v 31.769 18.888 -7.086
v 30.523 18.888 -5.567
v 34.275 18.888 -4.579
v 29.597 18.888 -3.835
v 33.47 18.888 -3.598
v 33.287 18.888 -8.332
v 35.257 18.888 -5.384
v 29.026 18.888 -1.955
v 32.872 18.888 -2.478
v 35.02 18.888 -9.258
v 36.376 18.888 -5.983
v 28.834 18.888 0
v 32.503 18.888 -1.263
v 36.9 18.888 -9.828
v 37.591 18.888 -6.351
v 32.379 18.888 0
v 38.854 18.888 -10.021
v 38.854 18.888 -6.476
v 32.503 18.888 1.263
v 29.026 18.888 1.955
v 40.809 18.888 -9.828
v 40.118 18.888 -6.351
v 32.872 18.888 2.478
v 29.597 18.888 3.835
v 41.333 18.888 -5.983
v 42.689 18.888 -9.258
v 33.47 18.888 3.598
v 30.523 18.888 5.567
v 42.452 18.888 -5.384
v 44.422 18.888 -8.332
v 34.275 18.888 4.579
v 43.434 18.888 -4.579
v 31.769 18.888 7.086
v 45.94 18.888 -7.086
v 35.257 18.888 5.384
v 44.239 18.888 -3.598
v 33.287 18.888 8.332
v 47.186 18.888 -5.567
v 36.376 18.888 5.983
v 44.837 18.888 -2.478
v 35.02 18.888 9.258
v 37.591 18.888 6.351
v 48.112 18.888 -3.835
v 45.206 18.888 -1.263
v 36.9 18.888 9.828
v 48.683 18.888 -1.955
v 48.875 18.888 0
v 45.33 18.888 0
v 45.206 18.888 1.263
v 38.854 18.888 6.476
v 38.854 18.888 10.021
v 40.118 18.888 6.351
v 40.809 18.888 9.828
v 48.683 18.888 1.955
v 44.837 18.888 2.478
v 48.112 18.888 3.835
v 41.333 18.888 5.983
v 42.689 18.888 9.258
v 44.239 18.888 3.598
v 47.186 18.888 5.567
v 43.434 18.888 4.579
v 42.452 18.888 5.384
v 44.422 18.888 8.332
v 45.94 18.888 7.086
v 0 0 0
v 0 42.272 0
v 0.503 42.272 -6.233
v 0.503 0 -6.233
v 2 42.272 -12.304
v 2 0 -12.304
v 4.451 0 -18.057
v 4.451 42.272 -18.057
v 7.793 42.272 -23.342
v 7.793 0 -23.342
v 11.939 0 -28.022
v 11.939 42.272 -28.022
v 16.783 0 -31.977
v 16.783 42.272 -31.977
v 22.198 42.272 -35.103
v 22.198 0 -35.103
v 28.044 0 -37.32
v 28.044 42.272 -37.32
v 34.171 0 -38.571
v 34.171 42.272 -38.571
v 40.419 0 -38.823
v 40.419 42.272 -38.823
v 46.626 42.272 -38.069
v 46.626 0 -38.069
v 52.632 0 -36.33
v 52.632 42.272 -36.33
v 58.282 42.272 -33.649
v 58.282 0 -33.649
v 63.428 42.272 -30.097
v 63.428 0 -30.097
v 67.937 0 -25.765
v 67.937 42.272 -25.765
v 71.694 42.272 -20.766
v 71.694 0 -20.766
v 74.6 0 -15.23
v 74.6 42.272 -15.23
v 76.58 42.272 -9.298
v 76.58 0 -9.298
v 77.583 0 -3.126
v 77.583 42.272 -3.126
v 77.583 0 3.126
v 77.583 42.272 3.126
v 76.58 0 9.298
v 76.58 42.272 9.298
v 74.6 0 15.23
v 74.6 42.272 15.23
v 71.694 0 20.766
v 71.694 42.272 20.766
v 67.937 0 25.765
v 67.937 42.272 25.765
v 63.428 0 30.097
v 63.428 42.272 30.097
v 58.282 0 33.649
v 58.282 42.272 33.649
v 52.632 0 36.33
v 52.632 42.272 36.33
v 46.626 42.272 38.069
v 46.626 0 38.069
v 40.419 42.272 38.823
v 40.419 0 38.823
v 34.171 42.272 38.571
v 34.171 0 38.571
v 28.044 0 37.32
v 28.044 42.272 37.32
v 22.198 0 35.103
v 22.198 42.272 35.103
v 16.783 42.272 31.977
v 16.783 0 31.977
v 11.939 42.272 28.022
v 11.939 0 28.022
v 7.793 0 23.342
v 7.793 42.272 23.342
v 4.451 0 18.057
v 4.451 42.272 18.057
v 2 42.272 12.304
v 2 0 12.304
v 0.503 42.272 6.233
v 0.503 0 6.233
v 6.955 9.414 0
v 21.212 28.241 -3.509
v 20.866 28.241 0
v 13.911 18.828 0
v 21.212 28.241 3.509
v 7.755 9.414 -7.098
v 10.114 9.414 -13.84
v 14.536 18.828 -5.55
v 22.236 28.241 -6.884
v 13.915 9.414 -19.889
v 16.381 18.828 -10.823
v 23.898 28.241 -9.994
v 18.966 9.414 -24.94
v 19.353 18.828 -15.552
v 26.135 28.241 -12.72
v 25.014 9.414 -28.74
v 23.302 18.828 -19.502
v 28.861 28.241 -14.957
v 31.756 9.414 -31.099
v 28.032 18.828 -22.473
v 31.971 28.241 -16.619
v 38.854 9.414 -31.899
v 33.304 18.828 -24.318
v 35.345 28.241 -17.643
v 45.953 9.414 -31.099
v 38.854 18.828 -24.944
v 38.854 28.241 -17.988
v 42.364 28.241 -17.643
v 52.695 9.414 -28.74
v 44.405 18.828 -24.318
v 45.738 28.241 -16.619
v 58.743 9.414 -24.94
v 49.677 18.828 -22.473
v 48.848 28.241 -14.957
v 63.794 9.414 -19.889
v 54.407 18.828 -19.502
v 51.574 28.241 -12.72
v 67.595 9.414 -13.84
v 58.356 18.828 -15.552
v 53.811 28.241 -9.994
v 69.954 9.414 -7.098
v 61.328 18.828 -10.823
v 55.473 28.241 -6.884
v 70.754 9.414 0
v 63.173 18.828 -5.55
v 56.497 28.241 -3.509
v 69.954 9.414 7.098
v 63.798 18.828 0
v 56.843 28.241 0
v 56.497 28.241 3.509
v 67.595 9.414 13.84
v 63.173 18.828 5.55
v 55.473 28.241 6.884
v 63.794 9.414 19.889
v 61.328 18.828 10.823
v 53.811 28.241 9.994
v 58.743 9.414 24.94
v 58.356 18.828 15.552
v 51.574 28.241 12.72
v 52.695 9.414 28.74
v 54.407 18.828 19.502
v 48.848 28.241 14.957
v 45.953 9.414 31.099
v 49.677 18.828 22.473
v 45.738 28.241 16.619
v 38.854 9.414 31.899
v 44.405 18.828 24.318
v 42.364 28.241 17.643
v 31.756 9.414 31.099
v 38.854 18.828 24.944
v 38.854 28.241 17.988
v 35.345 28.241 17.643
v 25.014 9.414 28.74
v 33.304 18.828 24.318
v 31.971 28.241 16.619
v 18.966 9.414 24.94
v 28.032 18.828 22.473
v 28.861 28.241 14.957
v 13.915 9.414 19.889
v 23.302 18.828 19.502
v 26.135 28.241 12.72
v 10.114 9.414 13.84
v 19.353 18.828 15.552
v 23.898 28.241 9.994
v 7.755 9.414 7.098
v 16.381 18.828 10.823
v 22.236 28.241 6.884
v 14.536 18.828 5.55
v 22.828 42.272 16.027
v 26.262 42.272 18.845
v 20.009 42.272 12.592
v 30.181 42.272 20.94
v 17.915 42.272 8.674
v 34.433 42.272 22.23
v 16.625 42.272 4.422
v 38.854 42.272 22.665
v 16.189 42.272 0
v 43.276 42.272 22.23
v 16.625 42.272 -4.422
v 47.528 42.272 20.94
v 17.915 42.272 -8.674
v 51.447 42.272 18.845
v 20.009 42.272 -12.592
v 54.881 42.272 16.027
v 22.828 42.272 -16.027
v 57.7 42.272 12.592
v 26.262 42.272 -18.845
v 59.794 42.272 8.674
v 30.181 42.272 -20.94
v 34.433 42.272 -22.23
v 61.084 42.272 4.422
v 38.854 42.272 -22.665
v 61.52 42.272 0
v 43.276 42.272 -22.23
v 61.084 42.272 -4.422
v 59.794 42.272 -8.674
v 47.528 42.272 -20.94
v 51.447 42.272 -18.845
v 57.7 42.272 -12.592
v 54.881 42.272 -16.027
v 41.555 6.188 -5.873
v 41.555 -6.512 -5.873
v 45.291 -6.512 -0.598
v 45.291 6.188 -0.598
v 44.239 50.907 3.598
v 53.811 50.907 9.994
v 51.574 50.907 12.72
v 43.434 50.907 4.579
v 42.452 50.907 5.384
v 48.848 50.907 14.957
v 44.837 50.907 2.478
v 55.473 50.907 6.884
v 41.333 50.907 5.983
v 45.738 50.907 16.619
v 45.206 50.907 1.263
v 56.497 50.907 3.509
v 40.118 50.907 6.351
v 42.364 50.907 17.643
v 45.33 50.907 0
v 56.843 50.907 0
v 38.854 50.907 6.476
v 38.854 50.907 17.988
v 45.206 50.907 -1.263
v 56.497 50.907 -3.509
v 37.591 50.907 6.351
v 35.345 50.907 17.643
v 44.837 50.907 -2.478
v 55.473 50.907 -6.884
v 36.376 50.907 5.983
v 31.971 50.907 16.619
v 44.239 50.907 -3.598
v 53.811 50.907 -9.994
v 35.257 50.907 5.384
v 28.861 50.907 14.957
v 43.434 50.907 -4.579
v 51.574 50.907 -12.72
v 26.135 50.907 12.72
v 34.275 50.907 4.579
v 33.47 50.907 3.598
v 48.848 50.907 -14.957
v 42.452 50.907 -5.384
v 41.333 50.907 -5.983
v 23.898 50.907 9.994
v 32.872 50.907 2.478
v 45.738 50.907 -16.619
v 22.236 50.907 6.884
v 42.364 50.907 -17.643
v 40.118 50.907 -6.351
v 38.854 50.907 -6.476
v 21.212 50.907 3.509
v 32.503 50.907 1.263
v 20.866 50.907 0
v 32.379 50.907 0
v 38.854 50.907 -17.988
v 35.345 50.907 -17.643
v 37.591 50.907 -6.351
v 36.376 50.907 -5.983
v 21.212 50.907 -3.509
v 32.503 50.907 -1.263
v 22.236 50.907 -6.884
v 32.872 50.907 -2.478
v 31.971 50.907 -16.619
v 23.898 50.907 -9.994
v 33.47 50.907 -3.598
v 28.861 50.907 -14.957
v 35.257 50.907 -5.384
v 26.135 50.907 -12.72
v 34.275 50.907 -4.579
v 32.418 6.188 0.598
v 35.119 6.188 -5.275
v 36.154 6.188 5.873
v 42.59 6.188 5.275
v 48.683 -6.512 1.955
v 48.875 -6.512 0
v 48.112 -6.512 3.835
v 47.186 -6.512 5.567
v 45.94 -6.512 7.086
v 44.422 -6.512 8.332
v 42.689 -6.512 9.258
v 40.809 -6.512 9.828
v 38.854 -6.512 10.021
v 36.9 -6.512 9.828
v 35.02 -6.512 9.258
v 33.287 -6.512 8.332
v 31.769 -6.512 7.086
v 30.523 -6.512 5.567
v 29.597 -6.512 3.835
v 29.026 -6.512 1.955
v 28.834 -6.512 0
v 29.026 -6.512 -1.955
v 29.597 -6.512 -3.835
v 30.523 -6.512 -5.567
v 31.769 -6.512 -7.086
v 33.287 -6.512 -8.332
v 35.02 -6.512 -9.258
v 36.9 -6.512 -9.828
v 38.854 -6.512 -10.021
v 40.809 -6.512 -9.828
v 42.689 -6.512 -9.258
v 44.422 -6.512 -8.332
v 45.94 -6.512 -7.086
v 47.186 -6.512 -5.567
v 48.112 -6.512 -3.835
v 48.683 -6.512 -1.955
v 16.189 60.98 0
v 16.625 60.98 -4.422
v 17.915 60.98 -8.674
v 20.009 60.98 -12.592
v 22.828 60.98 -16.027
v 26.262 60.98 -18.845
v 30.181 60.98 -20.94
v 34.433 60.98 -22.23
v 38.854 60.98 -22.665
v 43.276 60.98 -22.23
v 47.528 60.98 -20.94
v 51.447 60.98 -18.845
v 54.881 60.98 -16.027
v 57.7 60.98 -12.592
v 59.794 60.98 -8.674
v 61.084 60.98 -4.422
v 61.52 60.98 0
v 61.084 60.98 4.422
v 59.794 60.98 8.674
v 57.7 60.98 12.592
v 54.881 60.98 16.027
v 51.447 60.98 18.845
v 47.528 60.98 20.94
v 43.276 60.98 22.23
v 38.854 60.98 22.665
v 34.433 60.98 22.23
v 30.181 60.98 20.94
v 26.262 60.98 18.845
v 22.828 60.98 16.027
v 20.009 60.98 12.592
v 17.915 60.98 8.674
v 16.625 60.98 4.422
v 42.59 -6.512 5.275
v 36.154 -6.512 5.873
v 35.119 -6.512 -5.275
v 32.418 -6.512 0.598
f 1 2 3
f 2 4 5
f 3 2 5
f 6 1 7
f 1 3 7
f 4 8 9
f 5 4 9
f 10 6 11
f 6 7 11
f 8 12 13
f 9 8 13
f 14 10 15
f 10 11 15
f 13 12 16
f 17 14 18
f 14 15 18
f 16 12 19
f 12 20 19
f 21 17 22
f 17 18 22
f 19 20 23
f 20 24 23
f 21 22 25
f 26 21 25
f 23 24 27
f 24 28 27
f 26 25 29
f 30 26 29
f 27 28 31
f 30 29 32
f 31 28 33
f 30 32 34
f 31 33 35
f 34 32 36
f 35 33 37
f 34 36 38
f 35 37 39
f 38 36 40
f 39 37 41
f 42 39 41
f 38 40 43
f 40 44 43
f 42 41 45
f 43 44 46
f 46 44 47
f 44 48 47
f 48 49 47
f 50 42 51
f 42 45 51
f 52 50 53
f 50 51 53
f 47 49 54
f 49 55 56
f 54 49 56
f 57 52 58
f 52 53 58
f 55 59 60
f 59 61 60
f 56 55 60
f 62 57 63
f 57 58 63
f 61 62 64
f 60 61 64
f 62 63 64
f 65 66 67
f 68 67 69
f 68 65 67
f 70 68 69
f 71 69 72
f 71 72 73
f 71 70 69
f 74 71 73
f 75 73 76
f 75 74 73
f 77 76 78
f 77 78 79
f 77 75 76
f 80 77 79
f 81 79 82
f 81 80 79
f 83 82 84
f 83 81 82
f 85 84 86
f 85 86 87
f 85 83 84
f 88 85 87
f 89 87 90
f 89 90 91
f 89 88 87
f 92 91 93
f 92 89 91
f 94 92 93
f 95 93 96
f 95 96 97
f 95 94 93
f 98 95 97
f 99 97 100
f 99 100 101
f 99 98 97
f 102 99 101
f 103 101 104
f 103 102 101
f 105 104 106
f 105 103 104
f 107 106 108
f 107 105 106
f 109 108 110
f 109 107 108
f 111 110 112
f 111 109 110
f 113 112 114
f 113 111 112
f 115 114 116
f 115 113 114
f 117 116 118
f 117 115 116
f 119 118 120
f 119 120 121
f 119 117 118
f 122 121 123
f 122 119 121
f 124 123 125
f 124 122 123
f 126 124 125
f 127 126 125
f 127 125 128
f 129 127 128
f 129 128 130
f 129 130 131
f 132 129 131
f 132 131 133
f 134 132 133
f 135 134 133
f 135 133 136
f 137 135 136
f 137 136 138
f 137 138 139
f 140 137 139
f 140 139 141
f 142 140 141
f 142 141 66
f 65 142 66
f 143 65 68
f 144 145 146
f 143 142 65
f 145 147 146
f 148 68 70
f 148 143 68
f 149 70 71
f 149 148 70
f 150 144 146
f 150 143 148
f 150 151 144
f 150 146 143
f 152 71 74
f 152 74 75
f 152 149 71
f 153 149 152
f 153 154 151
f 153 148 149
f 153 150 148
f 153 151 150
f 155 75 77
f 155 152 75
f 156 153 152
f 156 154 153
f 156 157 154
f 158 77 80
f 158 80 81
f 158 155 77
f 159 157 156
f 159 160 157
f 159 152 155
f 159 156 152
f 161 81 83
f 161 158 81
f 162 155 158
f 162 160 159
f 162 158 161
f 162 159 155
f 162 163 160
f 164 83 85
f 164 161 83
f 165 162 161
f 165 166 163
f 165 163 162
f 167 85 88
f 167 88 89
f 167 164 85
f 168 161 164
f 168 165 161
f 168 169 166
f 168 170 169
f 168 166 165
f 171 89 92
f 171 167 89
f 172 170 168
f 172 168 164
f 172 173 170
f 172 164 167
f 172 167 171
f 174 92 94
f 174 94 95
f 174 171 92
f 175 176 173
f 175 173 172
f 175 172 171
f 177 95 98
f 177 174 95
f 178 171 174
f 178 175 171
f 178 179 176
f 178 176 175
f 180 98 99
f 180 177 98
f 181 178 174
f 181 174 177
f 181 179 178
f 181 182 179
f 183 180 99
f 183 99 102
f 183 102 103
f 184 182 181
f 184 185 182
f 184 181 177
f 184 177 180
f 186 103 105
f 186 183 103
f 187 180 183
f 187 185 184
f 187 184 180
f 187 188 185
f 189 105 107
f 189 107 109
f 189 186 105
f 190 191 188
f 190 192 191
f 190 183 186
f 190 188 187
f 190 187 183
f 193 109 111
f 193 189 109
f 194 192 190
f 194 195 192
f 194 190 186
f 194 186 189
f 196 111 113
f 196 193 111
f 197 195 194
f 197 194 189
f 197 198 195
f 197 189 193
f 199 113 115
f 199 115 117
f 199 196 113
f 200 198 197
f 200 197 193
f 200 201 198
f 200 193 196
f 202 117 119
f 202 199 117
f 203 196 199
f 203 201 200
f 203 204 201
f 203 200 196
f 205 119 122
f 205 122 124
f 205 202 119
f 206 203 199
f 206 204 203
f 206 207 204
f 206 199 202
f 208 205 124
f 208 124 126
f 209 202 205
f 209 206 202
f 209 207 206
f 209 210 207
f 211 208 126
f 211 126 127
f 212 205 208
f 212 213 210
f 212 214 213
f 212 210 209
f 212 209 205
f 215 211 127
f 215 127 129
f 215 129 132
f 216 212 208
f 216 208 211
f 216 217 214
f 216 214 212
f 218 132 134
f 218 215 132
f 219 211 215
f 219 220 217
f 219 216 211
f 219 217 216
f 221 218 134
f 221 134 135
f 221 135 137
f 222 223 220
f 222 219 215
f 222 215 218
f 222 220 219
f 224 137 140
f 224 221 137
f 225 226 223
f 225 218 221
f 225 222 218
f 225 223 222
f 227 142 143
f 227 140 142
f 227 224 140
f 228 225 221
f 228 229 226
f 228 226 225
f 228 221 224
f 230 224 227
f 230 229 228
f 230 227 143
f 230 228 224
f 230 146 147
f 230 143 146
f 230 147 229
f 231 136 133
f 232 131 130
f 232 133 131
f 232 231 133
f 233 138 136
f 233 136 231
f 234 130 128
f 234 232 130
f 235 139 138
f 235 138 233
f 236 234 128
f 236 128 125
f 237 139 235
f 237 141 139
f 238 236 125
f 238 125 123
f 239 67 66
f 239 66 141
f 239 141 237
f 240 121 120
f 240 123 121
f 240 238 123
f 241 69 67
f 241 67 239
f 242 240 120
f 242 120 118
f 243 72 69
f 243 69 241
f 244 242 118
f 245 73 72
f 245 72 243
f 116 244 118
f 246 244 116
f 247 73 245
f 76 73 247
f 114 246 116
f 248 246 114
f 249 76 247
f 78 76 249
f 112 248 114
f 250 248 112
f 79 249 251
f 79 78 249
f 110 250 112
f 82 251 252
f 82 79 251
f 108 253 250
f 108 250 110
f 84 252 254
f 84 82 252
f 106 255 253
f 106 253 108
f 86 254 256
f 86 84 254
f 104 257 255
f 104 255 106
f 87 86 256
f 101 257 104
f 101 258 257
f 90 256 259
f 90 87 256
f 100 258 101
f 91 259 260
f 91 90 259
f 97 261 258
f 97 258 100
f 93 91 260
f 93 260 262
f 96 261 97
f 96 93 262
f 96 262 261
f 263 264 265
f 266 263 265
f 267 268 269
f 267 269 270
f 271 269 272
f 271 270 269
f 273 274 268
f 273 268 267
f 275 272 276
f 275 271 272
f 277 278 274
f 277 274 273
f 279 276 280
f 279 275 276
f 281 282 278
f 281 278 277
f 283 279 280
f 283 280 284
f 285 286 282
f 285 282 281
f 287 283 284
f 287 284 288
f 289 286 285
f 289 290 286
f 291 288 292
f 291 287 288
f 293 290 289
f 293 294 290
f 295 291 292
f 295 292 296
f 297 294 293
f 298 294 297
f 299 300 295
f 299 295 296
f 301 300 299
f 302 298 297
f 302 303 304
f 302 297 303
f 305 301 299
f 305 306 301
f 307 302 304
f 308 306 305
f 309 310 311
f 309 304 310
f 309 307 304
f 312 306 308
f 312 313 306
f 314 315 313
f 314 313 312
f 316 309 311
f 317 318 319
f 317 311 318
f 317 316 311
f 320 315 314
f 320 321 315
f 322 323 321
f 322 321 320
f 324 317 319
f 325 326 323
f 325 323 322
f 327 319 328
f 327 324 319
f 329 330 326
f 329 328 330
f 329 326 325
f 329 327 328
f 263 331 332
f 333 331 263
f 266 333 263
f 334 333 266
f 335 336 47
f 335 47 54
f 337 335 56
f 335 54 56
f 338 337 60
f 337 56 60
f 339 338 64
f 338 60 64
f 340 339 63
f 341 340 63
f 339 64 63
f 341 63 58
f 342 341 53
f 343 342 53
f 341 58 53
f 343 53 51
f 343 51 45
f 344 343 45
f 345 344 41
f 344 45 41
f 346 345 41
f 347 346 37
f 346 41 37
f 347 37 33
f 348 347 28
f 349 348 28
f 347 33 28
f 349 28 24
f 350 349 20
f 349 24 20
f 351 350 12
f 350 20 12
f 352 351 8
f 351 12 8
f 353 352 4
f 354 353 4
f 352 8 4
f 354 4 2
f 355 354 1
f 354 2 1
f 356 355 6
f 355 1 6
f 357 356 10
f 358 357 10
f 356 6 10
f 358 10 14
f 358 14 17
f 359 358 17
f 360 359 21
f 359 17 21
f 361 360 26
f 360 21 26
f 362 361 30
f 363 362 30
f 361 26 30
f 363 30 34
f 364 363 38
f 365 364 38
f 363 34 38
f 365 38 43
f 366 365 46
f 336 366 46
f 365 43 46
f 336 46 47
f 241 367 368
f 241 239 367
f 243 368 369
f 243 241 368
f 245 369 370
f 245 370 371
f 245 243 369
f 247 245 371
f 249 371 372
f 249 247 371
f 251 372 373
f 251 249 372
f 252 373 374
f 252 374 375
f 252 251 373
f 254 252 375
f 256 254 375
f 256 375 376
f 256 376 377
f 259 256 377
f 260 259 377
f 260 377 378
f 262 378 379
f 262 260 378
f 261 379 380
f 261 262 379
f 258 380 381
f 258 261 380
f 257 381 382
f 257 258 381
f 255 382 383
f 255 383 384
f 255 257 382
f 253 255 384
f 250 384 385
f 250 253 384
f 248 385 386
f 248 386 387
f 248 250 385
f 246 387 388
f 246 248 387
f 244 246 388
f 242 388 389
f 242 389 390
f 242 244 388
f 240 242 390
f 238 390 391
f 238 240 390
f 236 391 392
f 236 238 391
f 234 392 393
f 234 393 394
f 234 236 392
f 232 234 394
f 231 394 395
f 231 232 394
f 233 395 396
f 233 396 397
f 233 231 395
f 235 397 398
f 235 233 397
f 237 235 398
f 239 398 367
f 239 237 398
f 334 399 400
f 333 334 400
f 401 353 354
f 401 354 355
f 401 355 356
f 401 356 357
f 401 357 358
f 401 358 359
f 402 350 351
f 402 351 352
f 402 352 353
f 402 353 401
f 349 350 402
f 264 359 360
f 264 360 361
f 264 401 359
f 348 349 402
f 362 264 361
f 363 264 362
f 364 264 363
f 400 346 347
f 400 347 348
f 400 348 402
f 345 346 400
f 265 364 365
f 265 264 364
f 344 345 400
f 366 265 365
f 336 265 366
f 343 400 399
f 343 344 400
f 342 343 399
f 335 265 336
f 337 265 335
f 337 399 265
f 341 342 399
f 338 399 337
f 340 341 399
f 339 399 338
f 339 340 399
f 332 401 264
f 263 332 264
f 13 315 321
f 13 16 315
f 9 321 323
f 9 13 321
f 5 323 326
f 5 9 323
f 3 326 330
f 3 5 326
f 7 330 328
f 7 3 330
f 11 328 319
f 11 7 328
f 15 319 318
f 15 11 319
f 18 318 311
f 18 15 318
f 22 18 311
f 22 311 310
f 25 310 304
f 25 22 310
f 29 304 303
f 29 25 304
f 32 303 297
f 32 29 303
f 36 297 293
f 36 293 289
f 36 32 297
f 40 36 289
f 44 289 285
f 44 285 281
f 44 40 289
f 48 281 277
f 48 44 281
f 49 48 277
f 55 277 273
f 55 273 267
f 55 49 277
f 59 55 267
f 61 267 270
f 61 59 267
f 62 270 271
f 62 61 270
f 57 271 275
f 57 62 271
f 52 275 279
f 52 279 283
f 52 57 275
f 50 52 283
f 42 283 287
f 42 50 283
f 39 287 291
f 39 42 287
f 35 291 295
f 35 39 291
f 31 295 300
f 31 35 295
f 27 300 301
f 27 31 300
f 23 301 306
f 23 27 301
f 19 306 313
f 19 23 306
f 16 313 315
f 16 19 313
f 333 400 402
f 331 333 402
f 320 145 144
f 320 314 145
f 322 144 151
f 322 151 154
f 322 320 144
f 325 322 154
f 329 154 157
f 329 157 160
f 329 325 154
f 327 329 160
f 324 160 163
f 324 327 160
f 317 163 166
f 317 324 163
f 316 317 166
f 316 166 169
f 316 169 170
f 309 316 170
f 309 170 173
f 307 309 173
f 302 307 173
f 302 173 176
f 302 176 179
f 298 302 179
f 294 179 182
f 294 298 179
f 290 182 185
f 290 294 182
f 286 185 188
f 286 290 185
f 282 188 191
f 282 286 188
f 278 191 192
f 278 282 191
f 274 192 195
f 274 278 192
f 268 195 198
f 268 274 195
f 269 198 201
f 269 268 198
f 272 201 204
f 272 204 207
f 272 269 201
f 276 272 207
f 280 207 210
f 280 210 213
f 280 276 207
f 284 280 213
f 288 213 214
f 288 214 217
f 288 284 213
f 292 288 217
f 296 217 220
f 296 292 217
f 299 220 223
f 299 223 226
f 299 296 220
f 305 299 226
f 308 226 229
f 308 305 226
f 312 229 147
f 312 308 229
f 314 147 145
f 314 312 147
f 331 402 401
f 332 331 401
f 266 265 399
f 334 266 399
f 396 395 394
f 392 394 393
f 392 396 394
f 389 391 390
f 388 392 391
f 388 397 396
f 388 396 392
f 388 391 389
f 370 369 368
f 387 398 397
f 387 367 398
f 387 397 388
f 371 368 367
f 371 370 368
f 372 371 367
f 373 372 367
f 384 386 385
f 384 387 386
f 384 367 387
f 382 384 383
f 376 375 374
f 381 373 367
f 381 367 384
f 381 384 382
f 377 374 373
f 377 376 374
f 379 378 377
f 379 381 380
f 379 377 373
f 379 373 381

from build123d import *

# Parameters (mm, degrees)
F2_R     = 10.020621
F3_DEPTH = 25.4
F5_DEPTH = 12.7


with BuildPart() as f1:
    # F0 (on Top) → F1 (revolve)
    with BuildSketch(Plane.XY):
        Polygon((0, 42.272214), (0, 0), (20.86629, 28.241435), (20.86629, 50.906539), (32.378726, 50.906539), (32.378726, 18.887583), (38.854469, 18.887583), (38.854469, 60.979918), (16.189363, 60.979918), (16.189363, 42.272214), align=None)
    revolve(axis=Axis((38.854469, 39.93375, 0), (0, -1, 0)))

    # F2 (on face) → F3 (join)
    with BuildSketch(Plane.XZ.offset(-18.887583)):
        with Locations((38.854469, 0)):
            Circle(F2_R)
    extrude(amount=F3_DEPTH)

    # F4 (on face) → F5 (cut)
    with BuildSketch(Plane.XZ.offset(6.512417)):
        Polygon((32.418266, 0.59764), (35.118796, -5.275095), (41.554998, -5.872735), (45.290671, -0.59764), (42.590141, 5.275095), (36.153939, 5.872735), align=None)
    extrude(amount=-F5_DEPTH, mode=Mode.SUBTRACT)


solid = f1.part
